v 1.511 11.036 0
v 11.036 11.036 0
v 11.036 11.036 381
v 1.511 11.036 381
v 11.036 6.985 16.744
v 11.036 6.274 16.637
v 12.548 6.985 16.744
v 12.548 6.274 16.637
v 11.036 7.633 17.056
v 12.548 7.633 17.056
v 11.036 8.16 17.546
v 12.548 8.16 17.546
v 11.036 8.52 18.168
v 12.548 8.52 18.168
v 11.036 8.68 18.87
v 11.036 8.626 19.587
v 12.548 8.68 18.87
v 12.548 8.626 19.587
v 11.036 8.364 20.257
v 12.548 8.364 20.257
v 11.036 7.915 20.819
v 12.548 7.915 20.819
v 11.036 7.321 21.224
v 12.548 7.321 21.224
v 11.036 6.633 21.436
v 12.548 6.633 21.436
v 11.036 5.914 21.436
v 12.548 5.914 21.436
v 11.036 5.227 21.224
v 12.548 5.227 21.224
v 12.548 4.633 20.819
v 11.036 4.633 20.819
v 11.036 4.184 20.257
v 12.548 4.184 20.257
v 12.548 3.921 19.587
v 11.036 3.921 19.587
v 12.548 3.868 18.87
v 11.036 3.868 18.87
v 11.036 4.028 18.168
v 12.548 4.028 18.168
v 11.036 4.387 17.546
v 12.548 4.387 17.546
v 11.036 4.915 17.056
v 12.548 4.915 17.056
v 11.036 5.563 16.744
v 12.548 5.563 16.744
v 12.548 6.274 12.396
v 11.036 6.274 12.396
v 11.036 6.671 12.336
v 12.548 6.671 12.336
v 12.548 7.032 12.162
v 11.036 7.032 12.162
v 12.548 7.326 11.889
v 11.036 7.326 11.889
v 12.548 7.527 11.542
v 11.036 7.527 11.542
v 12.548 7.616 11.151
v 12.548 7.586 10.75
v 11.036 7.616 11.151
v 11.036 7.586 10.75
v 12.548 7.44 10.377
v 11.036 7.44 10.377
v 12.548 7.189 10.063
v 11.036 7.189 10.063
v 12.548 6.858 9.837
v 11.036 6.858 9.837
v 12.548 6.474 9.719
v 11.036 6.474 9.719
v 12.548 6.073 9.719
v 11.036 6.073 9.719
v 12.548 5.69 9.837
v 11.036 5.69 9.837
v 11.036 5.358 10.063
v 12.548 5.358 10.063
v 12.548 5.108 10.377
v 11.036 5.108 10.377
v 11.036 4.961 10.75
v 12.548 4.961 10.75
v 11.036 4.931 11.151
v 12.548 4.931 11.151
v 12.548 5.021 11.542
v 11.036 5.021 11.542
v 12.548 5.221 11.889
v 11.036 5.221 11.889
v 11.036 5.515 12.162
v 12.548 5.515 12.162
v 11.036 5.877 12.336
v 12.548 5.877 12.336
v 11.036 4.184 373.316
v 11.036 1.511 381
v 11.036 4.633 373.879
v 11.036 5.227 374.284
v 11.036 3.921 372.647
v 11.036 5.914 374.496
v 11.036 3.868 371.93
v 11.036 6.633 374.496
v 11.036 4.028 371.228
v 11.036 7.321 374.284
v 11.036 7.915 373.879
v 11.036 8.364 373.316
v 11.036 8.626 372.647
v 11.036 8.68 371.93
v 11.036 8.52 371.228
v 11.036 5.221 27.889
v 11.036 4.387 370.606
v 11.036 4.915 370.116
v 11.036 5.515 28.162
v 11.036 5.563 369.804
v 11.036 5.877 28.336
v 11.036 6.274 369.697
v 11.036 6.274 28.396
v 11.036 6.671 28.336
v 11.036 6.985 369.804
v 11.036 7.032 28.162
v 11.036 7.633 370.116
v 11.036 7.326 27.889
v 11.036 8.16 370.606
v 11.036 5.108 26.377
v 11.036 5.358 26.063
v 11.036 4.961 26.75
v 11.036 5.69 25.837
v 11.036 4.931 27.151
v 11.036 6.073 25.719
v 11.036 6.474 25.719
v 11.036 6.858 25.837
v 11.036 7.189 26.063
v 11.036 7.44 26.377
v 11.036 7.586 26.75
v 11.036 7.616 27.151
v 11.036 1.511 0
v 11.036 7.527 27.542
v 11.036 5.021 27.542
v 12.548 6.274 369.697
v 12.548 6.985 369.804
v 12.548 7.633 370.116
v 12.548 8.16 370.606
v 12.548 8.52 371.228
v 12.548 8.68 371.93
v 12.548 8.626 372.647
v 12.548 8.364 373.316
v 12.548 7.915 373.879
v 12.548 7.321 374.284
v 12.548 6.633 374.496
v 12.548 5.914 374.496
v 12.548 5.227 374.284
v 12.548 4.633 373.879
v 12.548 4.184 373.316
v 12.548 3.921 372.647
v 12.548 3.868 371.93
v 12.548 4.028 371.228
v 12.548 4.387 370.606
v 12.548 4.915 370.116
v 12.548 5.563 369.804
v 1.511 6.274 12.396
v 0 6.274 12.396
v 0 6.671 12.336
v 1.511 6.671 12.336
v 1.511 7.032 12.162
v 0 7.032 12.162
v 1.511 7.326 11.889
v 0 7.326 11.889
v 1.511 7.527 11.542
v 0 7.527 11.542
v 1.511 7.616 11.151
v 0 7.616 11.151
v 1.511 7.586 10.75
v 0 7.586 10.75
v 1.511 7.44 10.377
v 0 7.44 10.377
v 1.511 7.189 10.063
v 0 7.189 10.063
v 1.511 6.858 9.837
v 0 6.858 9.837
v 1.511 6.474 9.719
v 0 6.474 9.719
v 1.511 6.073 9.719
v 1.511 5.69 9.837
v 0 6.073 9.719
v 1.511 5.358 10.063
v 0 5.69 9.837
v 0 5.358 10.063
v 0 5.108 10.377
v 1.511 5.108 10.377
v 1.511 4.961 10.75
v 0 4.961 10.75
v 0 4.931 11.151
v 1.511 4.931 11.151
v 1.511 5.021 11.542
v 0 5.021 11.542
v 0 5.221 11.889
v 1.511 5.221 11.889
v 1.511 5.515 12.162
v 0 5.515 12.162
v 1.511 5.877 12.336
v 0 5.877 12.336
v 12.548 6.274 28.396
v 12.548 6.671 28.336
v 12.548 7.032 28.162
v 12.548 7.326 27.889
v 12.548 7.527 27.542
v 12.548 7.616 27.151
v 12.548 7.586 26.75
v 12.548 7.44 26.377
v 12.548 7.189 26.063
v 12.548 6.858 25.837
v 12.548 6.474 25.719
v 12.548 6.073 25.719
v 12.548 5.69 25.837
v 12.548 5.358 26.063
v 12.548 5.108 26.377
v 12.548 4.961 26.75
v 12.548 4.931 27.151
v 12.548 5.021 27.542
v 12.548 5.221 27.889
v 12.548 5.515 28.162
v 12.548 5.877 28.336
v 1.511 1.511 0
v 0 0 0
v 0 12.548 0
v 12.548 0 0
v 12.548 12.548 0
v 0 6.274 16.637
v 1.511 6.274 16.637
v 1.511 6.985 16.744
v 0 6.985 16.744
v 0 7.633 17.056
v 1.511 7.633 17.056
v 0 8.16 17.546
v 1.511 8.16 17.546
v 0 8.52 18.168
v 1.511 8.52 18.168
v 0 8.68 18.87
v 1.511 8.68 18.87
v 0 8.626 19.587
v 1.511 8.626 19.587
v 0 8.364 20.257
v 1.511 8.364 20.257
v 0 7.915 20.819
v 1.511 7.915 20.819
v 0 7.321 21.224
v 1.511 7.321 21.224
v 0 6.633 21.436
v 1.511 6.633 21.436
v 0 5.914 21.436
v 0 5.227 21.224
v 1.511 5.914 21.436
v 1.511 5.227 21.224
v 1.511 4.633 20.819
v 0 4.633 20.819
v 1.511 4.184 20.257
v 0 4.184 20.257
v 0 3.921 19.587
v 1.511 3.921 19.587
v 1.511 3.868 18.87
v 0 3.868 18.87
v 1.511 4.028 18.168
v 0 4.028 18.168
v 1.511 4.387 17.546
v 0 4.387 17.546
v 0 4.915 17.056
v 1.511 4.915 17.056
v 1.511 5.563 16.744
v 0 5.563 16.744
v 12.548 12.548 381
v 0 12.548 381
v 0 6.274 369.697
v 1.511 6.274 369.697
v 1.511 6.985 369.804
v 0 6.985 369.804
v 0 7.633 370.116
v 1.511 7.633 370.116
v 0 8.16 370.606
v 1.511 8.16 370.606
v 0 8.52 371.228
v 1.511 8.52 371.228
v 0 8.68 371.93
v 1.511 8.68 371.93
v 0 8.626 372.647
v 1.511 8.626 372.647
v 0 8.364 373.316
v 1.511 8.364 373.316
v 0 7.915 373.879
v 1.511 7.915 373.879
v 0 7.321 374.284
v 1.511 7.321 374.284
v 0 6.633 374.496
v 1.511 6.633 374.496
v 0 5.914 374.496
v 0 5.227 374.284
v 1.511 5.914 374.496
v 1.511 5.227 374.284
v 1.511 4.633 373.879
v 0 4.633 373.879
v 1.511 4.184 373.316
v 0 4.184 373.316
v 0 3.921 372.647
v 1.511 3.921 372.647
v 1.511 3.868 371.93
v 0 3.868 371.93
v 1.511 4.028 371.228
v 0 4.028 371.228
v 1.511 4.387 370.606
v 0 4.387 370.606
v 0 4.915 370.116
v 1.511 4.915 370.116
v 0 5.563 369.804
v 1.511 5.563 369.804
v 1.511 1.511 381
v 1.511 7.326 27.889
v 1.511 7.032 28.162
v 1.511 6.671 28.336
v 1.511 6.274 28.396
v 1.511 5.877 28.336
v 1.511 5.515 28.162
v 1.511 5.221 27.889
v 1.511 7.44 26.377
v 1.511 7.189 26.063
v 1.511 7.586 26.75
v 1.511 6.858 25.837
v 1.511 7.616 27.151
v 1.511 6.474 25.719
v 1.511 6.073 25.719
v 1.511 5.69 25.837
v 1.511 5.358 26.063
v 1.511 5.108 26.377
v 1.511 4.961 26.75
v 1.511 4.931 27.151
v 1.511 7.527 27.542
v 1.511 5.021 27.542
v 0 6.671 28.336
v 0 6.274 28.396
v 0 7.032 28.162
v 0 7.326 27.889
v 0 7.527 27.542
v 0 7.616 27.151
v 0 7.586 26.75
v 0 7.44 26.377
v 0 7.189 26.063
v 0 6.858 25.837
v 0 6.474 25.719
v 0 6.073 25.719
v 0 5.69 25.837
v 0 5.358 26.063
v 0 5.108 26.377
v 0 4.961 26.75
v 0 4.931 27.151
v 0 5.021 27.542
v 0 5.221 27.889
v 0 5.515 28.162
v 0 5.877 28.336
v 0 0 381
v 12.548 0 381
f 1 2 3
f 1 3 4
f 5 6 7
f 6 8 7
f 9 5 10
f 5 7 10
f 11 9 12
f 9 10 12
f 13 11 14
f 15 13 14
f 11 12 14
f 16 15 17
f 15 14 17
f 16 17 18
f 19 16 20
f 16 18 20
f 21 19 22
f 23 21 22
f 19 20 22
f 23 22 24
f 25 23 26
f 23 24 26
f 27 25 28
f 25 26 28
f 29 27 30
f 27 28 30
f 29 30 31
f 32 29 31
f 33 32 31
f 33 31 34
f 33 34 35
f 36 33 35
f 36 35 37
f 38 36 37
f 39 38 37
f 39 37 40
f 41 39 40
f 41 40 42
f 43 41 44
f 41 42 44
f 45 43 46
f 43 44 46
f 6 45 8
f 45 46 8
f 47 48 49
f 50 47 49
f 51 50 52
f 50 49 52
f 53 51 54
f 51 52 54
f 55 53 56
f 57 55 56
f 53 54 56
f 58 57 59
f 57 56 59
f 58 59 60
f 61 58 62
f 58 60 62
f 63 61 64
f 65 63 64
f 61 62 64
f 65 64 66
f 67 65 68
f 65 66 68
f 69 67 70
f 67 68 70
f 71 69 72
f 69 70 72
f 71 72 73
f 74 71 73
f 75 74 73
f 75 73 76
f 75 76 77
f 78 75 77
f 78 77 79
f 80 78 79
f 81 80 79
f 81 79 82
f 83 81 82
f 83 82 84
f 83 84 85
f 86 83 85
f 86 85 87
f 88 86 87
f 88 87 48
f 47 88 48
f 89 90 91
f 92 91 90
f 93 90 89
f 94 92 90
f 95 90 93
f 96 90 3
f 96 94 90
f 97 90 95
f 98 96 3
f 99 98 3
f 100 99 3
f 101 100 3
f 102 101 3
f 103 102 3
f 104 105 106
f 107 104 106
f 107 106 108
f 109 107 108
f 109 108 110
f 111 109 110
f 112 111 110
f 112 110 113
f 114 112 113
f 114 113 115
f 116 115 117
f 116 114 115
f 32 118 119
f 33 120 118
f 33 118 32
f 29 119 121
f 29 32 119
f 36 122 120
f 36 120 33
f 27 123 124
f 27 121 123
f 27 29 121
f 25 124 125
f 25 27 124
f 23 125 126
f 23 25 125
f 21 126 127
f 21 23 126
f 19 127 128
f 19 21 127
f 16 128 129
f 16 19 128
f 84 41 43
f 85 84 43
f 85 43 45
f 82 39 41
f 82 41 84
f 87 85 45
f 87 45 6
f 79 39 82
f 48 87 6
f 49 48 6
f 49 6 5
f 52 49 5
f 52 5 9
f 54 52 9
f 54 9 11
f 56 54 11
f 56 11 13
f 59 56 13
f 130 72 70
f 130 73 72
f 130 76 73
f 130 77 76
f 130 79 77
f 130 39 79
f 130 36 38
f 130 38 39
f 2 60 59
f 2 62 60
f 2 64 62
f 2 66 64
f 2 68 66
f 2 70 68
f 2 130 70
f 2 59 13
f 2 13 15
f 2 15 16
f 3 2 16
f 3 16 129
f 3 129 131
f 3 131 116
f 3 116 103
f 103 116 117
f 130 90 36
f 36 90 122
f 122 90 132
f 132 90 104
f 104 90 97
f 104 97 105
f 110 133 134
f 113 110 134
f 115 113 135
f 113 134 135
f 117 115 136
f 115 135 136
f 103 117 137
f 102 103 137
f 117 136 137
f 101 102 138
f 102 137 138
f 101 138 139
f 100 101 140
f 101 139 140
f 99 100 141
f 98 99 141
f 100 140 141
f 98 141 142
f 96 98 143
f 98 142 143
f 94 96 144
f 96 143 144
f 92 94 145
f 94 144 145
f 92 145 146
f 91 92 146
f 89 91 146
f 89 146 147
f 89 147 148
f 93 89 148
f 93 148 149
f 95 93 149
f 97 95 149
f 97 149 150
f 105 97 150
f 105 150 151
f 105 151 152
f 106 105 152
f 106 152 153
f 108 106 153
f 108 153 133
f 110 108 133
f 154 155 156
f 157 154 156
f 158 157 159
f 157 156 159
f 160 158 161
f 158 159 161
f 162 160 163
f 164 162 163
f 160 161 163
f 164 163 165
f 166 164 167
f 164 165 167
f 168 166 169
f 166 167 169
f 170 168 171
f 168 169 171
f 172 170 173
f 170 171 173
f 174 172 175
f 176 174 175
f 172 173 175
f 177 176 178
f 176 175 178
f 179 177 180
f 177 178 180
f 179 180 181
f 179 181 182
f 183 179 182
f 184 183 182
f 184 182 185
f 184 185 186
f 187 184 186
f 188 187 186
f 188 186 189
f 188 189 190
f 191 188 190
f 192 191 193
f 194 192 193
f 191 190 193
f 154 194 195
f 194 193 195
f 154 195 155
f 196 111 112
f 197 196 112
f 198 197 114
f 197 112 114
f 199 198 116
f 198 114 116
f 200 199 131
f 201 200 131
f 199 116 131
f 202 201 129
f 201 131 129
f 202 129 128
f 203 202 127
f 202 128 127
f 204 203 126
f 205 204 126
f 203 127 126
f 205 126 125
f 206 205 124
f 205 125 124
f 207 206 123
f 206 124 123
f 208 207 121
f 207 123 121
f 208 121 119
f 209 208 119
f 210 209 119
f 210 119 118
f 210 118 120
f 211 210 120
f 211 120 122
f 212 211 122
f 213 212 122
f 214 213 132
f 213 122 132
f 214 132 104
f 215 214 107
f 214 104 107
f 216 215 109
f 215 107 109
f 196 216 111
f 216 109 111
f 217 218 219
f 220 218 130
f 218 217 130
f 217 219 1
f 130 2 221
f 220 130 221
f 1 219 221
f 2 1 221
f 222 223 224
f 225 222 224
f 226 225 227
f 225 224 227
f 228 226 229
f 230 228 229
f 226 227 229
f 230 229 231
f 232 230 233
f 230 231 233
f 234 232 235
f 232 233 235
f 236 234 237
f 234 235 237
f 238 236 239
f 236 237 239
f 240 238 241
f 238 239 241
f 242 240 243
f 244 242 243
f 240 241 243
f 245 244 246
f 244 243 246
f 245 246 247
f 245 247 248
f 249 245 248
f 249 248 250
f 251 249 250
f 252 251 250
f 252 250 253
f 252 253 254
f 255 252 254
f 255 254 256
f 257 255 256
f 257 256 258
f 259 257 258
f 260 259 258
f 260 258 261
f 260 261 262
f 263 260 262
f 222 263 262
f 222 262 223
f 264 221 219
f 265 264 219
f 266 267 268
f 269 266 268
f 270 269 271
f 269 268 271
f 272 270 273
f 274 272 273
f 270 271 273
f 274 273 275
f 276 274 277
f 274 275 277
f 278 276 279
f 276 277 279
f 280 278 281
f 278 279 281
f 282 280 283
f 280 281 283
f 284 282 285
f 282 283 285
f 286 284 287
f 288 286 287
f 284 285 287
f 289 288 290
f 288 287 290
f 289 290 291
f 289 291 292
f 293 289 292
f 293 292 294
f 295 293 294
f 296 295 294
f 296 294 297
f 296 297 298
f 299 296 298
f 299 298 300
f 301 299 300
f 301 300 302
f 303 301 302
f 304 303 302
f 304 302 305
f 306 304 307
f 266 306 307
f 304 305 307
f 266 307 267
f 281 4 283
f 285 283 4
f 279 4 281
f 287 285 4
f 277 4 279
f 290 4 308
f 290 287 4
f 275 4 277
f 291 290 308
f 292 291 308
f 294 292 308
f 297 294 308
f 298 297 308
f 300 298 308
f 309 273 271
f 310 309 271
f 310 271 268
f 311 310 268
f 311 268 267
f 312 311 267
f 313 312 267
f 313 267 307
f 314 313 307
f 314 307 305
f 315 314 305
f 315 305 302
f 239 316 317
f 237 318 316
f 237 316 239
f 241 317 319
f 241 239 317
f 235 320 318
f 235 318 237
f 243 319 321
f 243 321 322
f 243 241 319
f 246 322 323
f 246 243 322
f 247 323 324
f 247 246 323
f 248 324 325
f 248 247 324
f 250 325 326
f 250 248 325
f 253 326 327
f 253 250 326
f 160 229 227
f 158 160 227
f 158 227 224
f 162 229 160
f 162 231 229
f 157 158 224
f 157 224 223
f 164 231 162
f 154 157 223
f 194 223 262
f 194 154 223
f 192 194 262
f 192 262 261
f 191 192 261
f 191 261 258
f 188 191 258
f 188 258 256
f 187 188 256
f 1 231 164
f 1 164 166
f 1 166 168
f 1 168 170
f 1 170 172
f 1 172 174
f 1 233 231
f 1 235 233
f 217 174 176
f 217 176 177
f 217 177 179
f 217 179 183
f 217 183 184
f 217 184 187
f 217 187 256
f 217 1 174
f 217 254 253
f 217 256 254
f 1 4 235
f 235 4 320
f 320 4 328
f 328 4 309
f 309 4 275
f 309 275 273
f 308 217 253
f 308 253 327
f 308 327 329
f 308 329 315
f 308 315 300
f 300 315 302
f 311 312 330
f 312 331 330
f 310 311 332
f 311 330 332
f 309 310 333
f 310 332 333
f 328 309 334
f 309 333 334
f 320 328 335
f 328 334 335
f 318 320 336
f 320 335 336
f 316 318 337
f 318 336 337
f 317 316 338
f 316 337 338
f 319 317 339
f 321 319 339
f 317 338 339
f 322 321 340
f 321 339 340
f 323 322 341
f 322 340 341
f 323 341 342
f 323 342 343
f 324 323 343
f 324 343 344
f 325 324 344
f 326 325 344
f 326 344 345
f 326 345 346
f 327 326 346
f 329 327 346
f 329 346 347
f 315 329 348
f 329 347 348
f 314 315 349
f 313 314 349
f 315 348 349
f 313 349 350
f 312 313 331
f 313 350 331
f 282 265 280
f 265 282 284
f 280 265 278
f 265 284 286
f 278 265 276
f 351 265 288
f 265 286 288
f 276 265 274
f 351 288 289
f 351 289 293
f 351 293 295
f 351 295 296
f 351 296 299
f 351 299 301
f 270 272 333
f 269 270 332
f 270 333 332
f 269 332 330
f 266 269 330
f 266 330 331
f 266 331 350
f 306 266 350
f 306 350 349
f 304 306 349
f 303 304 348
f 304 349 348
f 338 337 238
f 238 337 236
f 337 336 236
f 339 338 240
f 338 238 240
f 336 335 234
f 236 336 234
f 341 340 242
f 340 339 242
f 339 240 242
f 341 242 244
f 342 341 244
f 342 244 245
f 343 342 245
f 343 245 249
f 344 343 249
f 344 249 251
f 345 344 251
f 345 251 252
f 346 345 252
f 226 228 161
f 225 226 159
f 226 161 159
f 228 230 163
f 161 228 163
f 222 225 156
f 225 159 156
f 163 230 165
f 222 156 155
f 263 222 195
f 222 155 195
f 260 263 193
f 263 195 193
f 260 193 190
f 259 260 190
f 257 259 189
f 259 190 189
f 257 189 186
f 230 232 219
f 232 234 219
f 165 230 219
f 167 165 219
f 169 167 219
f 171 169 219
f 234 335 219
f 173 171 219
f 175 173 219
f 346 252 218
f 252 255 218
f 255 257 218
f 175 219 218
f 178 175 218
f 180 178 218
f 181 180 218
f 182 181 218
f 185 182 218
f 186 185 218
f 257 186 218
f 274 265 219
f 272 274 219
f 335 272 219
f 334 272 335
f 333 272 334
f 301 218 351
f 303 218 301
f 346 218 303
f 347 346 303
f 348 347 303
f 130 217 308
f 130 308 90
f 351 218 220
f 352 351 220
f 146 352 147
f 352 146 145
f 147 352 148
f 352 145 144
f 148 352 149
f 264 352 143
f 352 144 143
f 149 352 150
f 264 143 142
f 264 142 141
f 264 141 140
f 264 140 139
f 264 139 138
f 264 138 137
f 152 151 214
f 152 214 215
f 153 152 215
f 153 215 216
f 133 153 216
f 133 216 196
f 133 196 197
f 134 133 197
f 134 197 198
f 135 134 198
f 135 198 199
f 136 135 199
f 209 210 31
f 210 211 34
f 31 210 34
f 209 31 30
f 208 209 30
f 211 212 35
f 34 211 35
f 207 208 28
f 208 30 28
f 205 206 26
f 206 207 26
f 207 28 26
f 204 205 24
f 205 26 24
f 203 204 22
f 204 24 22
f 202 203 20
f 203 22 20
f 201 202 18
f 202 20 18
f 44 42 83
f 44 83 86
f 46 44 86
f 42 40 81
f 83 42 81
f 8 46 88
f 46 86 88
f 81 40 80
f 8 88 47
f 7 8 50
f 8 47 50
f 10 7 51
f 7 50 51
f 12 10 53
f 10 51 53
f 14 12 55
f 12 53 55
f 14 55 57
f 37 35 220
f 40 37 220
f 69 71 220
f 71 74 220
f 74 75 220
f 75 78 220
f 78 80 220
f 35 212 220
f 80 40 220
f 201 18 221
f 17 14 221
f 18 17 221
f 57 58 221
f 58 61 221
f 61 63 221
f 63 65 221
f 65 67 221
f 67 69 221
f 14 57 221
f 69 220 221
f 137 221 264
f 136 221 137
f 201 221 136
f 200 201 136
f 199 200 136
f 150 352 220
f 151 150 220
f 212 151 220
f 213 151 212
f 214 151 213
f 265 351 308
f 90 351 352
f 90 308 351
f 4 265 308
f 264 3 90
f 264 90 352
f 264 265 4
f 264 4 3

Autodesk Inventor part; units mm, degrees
ref_plane "YZ Plane" through (0, 0, 0) normal (1, 0, 0) x (0, 1, 0)
ref_plane "XZ Plane" through (0, 0, 0) normal (0, 1, 0) x (-1, 0, 0)
ref_plane "XY Plane" through (0, 0, 0) normal (0, 0, 1) x (1, 0, 0)
sketch "Sketch1" plane through (0, 0, 0) normal (0, 0, 1) x (1, 0, 0)
  line L0 (0, 0) -> (12.5476, 0)
  line L1 (12.5476, 0) -> (12.5476, 12.5476)
  line L2 (12.5476, 12.5476) -> (0, 12.5476)
  line L3 (0, 12.5476) -> (0, 0)
  line L4 (1.5113, 1.5113) -> (11.0363, 1.5113)
  line L5 (11.0363, 1.5113) -> (11.0363, 11.0363)
  line L6 (11.0363, 11.0363) -> (1.5113, 11.0363)
  line L7 (1.5113, 11.0363) -> (1.5113, 1.5113)
  line L8 (1.5113, 1.5113) -> (11.0363, 11.0363) construction
  line L9 (11.0363, 1.5113) -> (1.5113, 11.0363) construction
  point P0 (6.2738, 6.2738)
  dimension "d0" = 12.5476
  dimension "d1" = 12.5476
  dimension "d2" = 9.525
  dimension "d3" = 9.525
extrude "Extrusion1" add sketch "Sketch1" along normal blind 381
sketch "Sketch2" plane through (12.5476, 0, 0) normal (1, 0, 0) x (0, 0, -1)
  circle A0 centre (-19.05, 6.2738) radius 2.413
  line L0 (0, 0) -> (0, 12.5476) projected
  dimension "d6" = 4.826
  dimension "d13" = 19.05
extrude "Extrusion2" cut sketch "Sketch2" against normal blind 419.1
sketch "Sketch3" plane through (12.5476, 0, 0) normal (1, 0, 0) x (0, 0, -1)
  circle A0 centre (-372.11, 6.2738) radius 2.413
  line L0 (-381, 0) -> (-381, 12.5476) projected
  dimension "d9" = 4.826
  dimension "d12" = 8.89
extrude "Extrusion3" cut sketch "Sketch3" against normal blind 25.4
sketch "Sketch5" plane through (0, 0, 0) normal (-1, 0, 0) x (0, 0, 1)
  circle A0 centre (19.05, 6.2738) radius 2.413 projected
  circle A1 centre (11.05, 6.2738) radius 1.3462
  circle A2 centre (27.05, 6.2738) radius 1.3462
  line L0 (0, 12.5476) -> (381, 12.5476) projected
  line L1 (11.05, 6.2738) -> (27.05, 6.2738)
  line L2 (0, 12.5476) -> (0, 0) projected
  dimension "d14" = 2.6924
  dimension "d15" = 2.6924
  dimension "d16" = 16
  dimension "d19" = 11.05
  dimension "d20" = 19.05
  dimension "d21" = 27.05
extrude "Extrusion4" cut sketch "Sketch5" against normal blind 12.7 contours A1 | A2
properties part number "custom Box Aluminum" material "Aluminum 6061"
